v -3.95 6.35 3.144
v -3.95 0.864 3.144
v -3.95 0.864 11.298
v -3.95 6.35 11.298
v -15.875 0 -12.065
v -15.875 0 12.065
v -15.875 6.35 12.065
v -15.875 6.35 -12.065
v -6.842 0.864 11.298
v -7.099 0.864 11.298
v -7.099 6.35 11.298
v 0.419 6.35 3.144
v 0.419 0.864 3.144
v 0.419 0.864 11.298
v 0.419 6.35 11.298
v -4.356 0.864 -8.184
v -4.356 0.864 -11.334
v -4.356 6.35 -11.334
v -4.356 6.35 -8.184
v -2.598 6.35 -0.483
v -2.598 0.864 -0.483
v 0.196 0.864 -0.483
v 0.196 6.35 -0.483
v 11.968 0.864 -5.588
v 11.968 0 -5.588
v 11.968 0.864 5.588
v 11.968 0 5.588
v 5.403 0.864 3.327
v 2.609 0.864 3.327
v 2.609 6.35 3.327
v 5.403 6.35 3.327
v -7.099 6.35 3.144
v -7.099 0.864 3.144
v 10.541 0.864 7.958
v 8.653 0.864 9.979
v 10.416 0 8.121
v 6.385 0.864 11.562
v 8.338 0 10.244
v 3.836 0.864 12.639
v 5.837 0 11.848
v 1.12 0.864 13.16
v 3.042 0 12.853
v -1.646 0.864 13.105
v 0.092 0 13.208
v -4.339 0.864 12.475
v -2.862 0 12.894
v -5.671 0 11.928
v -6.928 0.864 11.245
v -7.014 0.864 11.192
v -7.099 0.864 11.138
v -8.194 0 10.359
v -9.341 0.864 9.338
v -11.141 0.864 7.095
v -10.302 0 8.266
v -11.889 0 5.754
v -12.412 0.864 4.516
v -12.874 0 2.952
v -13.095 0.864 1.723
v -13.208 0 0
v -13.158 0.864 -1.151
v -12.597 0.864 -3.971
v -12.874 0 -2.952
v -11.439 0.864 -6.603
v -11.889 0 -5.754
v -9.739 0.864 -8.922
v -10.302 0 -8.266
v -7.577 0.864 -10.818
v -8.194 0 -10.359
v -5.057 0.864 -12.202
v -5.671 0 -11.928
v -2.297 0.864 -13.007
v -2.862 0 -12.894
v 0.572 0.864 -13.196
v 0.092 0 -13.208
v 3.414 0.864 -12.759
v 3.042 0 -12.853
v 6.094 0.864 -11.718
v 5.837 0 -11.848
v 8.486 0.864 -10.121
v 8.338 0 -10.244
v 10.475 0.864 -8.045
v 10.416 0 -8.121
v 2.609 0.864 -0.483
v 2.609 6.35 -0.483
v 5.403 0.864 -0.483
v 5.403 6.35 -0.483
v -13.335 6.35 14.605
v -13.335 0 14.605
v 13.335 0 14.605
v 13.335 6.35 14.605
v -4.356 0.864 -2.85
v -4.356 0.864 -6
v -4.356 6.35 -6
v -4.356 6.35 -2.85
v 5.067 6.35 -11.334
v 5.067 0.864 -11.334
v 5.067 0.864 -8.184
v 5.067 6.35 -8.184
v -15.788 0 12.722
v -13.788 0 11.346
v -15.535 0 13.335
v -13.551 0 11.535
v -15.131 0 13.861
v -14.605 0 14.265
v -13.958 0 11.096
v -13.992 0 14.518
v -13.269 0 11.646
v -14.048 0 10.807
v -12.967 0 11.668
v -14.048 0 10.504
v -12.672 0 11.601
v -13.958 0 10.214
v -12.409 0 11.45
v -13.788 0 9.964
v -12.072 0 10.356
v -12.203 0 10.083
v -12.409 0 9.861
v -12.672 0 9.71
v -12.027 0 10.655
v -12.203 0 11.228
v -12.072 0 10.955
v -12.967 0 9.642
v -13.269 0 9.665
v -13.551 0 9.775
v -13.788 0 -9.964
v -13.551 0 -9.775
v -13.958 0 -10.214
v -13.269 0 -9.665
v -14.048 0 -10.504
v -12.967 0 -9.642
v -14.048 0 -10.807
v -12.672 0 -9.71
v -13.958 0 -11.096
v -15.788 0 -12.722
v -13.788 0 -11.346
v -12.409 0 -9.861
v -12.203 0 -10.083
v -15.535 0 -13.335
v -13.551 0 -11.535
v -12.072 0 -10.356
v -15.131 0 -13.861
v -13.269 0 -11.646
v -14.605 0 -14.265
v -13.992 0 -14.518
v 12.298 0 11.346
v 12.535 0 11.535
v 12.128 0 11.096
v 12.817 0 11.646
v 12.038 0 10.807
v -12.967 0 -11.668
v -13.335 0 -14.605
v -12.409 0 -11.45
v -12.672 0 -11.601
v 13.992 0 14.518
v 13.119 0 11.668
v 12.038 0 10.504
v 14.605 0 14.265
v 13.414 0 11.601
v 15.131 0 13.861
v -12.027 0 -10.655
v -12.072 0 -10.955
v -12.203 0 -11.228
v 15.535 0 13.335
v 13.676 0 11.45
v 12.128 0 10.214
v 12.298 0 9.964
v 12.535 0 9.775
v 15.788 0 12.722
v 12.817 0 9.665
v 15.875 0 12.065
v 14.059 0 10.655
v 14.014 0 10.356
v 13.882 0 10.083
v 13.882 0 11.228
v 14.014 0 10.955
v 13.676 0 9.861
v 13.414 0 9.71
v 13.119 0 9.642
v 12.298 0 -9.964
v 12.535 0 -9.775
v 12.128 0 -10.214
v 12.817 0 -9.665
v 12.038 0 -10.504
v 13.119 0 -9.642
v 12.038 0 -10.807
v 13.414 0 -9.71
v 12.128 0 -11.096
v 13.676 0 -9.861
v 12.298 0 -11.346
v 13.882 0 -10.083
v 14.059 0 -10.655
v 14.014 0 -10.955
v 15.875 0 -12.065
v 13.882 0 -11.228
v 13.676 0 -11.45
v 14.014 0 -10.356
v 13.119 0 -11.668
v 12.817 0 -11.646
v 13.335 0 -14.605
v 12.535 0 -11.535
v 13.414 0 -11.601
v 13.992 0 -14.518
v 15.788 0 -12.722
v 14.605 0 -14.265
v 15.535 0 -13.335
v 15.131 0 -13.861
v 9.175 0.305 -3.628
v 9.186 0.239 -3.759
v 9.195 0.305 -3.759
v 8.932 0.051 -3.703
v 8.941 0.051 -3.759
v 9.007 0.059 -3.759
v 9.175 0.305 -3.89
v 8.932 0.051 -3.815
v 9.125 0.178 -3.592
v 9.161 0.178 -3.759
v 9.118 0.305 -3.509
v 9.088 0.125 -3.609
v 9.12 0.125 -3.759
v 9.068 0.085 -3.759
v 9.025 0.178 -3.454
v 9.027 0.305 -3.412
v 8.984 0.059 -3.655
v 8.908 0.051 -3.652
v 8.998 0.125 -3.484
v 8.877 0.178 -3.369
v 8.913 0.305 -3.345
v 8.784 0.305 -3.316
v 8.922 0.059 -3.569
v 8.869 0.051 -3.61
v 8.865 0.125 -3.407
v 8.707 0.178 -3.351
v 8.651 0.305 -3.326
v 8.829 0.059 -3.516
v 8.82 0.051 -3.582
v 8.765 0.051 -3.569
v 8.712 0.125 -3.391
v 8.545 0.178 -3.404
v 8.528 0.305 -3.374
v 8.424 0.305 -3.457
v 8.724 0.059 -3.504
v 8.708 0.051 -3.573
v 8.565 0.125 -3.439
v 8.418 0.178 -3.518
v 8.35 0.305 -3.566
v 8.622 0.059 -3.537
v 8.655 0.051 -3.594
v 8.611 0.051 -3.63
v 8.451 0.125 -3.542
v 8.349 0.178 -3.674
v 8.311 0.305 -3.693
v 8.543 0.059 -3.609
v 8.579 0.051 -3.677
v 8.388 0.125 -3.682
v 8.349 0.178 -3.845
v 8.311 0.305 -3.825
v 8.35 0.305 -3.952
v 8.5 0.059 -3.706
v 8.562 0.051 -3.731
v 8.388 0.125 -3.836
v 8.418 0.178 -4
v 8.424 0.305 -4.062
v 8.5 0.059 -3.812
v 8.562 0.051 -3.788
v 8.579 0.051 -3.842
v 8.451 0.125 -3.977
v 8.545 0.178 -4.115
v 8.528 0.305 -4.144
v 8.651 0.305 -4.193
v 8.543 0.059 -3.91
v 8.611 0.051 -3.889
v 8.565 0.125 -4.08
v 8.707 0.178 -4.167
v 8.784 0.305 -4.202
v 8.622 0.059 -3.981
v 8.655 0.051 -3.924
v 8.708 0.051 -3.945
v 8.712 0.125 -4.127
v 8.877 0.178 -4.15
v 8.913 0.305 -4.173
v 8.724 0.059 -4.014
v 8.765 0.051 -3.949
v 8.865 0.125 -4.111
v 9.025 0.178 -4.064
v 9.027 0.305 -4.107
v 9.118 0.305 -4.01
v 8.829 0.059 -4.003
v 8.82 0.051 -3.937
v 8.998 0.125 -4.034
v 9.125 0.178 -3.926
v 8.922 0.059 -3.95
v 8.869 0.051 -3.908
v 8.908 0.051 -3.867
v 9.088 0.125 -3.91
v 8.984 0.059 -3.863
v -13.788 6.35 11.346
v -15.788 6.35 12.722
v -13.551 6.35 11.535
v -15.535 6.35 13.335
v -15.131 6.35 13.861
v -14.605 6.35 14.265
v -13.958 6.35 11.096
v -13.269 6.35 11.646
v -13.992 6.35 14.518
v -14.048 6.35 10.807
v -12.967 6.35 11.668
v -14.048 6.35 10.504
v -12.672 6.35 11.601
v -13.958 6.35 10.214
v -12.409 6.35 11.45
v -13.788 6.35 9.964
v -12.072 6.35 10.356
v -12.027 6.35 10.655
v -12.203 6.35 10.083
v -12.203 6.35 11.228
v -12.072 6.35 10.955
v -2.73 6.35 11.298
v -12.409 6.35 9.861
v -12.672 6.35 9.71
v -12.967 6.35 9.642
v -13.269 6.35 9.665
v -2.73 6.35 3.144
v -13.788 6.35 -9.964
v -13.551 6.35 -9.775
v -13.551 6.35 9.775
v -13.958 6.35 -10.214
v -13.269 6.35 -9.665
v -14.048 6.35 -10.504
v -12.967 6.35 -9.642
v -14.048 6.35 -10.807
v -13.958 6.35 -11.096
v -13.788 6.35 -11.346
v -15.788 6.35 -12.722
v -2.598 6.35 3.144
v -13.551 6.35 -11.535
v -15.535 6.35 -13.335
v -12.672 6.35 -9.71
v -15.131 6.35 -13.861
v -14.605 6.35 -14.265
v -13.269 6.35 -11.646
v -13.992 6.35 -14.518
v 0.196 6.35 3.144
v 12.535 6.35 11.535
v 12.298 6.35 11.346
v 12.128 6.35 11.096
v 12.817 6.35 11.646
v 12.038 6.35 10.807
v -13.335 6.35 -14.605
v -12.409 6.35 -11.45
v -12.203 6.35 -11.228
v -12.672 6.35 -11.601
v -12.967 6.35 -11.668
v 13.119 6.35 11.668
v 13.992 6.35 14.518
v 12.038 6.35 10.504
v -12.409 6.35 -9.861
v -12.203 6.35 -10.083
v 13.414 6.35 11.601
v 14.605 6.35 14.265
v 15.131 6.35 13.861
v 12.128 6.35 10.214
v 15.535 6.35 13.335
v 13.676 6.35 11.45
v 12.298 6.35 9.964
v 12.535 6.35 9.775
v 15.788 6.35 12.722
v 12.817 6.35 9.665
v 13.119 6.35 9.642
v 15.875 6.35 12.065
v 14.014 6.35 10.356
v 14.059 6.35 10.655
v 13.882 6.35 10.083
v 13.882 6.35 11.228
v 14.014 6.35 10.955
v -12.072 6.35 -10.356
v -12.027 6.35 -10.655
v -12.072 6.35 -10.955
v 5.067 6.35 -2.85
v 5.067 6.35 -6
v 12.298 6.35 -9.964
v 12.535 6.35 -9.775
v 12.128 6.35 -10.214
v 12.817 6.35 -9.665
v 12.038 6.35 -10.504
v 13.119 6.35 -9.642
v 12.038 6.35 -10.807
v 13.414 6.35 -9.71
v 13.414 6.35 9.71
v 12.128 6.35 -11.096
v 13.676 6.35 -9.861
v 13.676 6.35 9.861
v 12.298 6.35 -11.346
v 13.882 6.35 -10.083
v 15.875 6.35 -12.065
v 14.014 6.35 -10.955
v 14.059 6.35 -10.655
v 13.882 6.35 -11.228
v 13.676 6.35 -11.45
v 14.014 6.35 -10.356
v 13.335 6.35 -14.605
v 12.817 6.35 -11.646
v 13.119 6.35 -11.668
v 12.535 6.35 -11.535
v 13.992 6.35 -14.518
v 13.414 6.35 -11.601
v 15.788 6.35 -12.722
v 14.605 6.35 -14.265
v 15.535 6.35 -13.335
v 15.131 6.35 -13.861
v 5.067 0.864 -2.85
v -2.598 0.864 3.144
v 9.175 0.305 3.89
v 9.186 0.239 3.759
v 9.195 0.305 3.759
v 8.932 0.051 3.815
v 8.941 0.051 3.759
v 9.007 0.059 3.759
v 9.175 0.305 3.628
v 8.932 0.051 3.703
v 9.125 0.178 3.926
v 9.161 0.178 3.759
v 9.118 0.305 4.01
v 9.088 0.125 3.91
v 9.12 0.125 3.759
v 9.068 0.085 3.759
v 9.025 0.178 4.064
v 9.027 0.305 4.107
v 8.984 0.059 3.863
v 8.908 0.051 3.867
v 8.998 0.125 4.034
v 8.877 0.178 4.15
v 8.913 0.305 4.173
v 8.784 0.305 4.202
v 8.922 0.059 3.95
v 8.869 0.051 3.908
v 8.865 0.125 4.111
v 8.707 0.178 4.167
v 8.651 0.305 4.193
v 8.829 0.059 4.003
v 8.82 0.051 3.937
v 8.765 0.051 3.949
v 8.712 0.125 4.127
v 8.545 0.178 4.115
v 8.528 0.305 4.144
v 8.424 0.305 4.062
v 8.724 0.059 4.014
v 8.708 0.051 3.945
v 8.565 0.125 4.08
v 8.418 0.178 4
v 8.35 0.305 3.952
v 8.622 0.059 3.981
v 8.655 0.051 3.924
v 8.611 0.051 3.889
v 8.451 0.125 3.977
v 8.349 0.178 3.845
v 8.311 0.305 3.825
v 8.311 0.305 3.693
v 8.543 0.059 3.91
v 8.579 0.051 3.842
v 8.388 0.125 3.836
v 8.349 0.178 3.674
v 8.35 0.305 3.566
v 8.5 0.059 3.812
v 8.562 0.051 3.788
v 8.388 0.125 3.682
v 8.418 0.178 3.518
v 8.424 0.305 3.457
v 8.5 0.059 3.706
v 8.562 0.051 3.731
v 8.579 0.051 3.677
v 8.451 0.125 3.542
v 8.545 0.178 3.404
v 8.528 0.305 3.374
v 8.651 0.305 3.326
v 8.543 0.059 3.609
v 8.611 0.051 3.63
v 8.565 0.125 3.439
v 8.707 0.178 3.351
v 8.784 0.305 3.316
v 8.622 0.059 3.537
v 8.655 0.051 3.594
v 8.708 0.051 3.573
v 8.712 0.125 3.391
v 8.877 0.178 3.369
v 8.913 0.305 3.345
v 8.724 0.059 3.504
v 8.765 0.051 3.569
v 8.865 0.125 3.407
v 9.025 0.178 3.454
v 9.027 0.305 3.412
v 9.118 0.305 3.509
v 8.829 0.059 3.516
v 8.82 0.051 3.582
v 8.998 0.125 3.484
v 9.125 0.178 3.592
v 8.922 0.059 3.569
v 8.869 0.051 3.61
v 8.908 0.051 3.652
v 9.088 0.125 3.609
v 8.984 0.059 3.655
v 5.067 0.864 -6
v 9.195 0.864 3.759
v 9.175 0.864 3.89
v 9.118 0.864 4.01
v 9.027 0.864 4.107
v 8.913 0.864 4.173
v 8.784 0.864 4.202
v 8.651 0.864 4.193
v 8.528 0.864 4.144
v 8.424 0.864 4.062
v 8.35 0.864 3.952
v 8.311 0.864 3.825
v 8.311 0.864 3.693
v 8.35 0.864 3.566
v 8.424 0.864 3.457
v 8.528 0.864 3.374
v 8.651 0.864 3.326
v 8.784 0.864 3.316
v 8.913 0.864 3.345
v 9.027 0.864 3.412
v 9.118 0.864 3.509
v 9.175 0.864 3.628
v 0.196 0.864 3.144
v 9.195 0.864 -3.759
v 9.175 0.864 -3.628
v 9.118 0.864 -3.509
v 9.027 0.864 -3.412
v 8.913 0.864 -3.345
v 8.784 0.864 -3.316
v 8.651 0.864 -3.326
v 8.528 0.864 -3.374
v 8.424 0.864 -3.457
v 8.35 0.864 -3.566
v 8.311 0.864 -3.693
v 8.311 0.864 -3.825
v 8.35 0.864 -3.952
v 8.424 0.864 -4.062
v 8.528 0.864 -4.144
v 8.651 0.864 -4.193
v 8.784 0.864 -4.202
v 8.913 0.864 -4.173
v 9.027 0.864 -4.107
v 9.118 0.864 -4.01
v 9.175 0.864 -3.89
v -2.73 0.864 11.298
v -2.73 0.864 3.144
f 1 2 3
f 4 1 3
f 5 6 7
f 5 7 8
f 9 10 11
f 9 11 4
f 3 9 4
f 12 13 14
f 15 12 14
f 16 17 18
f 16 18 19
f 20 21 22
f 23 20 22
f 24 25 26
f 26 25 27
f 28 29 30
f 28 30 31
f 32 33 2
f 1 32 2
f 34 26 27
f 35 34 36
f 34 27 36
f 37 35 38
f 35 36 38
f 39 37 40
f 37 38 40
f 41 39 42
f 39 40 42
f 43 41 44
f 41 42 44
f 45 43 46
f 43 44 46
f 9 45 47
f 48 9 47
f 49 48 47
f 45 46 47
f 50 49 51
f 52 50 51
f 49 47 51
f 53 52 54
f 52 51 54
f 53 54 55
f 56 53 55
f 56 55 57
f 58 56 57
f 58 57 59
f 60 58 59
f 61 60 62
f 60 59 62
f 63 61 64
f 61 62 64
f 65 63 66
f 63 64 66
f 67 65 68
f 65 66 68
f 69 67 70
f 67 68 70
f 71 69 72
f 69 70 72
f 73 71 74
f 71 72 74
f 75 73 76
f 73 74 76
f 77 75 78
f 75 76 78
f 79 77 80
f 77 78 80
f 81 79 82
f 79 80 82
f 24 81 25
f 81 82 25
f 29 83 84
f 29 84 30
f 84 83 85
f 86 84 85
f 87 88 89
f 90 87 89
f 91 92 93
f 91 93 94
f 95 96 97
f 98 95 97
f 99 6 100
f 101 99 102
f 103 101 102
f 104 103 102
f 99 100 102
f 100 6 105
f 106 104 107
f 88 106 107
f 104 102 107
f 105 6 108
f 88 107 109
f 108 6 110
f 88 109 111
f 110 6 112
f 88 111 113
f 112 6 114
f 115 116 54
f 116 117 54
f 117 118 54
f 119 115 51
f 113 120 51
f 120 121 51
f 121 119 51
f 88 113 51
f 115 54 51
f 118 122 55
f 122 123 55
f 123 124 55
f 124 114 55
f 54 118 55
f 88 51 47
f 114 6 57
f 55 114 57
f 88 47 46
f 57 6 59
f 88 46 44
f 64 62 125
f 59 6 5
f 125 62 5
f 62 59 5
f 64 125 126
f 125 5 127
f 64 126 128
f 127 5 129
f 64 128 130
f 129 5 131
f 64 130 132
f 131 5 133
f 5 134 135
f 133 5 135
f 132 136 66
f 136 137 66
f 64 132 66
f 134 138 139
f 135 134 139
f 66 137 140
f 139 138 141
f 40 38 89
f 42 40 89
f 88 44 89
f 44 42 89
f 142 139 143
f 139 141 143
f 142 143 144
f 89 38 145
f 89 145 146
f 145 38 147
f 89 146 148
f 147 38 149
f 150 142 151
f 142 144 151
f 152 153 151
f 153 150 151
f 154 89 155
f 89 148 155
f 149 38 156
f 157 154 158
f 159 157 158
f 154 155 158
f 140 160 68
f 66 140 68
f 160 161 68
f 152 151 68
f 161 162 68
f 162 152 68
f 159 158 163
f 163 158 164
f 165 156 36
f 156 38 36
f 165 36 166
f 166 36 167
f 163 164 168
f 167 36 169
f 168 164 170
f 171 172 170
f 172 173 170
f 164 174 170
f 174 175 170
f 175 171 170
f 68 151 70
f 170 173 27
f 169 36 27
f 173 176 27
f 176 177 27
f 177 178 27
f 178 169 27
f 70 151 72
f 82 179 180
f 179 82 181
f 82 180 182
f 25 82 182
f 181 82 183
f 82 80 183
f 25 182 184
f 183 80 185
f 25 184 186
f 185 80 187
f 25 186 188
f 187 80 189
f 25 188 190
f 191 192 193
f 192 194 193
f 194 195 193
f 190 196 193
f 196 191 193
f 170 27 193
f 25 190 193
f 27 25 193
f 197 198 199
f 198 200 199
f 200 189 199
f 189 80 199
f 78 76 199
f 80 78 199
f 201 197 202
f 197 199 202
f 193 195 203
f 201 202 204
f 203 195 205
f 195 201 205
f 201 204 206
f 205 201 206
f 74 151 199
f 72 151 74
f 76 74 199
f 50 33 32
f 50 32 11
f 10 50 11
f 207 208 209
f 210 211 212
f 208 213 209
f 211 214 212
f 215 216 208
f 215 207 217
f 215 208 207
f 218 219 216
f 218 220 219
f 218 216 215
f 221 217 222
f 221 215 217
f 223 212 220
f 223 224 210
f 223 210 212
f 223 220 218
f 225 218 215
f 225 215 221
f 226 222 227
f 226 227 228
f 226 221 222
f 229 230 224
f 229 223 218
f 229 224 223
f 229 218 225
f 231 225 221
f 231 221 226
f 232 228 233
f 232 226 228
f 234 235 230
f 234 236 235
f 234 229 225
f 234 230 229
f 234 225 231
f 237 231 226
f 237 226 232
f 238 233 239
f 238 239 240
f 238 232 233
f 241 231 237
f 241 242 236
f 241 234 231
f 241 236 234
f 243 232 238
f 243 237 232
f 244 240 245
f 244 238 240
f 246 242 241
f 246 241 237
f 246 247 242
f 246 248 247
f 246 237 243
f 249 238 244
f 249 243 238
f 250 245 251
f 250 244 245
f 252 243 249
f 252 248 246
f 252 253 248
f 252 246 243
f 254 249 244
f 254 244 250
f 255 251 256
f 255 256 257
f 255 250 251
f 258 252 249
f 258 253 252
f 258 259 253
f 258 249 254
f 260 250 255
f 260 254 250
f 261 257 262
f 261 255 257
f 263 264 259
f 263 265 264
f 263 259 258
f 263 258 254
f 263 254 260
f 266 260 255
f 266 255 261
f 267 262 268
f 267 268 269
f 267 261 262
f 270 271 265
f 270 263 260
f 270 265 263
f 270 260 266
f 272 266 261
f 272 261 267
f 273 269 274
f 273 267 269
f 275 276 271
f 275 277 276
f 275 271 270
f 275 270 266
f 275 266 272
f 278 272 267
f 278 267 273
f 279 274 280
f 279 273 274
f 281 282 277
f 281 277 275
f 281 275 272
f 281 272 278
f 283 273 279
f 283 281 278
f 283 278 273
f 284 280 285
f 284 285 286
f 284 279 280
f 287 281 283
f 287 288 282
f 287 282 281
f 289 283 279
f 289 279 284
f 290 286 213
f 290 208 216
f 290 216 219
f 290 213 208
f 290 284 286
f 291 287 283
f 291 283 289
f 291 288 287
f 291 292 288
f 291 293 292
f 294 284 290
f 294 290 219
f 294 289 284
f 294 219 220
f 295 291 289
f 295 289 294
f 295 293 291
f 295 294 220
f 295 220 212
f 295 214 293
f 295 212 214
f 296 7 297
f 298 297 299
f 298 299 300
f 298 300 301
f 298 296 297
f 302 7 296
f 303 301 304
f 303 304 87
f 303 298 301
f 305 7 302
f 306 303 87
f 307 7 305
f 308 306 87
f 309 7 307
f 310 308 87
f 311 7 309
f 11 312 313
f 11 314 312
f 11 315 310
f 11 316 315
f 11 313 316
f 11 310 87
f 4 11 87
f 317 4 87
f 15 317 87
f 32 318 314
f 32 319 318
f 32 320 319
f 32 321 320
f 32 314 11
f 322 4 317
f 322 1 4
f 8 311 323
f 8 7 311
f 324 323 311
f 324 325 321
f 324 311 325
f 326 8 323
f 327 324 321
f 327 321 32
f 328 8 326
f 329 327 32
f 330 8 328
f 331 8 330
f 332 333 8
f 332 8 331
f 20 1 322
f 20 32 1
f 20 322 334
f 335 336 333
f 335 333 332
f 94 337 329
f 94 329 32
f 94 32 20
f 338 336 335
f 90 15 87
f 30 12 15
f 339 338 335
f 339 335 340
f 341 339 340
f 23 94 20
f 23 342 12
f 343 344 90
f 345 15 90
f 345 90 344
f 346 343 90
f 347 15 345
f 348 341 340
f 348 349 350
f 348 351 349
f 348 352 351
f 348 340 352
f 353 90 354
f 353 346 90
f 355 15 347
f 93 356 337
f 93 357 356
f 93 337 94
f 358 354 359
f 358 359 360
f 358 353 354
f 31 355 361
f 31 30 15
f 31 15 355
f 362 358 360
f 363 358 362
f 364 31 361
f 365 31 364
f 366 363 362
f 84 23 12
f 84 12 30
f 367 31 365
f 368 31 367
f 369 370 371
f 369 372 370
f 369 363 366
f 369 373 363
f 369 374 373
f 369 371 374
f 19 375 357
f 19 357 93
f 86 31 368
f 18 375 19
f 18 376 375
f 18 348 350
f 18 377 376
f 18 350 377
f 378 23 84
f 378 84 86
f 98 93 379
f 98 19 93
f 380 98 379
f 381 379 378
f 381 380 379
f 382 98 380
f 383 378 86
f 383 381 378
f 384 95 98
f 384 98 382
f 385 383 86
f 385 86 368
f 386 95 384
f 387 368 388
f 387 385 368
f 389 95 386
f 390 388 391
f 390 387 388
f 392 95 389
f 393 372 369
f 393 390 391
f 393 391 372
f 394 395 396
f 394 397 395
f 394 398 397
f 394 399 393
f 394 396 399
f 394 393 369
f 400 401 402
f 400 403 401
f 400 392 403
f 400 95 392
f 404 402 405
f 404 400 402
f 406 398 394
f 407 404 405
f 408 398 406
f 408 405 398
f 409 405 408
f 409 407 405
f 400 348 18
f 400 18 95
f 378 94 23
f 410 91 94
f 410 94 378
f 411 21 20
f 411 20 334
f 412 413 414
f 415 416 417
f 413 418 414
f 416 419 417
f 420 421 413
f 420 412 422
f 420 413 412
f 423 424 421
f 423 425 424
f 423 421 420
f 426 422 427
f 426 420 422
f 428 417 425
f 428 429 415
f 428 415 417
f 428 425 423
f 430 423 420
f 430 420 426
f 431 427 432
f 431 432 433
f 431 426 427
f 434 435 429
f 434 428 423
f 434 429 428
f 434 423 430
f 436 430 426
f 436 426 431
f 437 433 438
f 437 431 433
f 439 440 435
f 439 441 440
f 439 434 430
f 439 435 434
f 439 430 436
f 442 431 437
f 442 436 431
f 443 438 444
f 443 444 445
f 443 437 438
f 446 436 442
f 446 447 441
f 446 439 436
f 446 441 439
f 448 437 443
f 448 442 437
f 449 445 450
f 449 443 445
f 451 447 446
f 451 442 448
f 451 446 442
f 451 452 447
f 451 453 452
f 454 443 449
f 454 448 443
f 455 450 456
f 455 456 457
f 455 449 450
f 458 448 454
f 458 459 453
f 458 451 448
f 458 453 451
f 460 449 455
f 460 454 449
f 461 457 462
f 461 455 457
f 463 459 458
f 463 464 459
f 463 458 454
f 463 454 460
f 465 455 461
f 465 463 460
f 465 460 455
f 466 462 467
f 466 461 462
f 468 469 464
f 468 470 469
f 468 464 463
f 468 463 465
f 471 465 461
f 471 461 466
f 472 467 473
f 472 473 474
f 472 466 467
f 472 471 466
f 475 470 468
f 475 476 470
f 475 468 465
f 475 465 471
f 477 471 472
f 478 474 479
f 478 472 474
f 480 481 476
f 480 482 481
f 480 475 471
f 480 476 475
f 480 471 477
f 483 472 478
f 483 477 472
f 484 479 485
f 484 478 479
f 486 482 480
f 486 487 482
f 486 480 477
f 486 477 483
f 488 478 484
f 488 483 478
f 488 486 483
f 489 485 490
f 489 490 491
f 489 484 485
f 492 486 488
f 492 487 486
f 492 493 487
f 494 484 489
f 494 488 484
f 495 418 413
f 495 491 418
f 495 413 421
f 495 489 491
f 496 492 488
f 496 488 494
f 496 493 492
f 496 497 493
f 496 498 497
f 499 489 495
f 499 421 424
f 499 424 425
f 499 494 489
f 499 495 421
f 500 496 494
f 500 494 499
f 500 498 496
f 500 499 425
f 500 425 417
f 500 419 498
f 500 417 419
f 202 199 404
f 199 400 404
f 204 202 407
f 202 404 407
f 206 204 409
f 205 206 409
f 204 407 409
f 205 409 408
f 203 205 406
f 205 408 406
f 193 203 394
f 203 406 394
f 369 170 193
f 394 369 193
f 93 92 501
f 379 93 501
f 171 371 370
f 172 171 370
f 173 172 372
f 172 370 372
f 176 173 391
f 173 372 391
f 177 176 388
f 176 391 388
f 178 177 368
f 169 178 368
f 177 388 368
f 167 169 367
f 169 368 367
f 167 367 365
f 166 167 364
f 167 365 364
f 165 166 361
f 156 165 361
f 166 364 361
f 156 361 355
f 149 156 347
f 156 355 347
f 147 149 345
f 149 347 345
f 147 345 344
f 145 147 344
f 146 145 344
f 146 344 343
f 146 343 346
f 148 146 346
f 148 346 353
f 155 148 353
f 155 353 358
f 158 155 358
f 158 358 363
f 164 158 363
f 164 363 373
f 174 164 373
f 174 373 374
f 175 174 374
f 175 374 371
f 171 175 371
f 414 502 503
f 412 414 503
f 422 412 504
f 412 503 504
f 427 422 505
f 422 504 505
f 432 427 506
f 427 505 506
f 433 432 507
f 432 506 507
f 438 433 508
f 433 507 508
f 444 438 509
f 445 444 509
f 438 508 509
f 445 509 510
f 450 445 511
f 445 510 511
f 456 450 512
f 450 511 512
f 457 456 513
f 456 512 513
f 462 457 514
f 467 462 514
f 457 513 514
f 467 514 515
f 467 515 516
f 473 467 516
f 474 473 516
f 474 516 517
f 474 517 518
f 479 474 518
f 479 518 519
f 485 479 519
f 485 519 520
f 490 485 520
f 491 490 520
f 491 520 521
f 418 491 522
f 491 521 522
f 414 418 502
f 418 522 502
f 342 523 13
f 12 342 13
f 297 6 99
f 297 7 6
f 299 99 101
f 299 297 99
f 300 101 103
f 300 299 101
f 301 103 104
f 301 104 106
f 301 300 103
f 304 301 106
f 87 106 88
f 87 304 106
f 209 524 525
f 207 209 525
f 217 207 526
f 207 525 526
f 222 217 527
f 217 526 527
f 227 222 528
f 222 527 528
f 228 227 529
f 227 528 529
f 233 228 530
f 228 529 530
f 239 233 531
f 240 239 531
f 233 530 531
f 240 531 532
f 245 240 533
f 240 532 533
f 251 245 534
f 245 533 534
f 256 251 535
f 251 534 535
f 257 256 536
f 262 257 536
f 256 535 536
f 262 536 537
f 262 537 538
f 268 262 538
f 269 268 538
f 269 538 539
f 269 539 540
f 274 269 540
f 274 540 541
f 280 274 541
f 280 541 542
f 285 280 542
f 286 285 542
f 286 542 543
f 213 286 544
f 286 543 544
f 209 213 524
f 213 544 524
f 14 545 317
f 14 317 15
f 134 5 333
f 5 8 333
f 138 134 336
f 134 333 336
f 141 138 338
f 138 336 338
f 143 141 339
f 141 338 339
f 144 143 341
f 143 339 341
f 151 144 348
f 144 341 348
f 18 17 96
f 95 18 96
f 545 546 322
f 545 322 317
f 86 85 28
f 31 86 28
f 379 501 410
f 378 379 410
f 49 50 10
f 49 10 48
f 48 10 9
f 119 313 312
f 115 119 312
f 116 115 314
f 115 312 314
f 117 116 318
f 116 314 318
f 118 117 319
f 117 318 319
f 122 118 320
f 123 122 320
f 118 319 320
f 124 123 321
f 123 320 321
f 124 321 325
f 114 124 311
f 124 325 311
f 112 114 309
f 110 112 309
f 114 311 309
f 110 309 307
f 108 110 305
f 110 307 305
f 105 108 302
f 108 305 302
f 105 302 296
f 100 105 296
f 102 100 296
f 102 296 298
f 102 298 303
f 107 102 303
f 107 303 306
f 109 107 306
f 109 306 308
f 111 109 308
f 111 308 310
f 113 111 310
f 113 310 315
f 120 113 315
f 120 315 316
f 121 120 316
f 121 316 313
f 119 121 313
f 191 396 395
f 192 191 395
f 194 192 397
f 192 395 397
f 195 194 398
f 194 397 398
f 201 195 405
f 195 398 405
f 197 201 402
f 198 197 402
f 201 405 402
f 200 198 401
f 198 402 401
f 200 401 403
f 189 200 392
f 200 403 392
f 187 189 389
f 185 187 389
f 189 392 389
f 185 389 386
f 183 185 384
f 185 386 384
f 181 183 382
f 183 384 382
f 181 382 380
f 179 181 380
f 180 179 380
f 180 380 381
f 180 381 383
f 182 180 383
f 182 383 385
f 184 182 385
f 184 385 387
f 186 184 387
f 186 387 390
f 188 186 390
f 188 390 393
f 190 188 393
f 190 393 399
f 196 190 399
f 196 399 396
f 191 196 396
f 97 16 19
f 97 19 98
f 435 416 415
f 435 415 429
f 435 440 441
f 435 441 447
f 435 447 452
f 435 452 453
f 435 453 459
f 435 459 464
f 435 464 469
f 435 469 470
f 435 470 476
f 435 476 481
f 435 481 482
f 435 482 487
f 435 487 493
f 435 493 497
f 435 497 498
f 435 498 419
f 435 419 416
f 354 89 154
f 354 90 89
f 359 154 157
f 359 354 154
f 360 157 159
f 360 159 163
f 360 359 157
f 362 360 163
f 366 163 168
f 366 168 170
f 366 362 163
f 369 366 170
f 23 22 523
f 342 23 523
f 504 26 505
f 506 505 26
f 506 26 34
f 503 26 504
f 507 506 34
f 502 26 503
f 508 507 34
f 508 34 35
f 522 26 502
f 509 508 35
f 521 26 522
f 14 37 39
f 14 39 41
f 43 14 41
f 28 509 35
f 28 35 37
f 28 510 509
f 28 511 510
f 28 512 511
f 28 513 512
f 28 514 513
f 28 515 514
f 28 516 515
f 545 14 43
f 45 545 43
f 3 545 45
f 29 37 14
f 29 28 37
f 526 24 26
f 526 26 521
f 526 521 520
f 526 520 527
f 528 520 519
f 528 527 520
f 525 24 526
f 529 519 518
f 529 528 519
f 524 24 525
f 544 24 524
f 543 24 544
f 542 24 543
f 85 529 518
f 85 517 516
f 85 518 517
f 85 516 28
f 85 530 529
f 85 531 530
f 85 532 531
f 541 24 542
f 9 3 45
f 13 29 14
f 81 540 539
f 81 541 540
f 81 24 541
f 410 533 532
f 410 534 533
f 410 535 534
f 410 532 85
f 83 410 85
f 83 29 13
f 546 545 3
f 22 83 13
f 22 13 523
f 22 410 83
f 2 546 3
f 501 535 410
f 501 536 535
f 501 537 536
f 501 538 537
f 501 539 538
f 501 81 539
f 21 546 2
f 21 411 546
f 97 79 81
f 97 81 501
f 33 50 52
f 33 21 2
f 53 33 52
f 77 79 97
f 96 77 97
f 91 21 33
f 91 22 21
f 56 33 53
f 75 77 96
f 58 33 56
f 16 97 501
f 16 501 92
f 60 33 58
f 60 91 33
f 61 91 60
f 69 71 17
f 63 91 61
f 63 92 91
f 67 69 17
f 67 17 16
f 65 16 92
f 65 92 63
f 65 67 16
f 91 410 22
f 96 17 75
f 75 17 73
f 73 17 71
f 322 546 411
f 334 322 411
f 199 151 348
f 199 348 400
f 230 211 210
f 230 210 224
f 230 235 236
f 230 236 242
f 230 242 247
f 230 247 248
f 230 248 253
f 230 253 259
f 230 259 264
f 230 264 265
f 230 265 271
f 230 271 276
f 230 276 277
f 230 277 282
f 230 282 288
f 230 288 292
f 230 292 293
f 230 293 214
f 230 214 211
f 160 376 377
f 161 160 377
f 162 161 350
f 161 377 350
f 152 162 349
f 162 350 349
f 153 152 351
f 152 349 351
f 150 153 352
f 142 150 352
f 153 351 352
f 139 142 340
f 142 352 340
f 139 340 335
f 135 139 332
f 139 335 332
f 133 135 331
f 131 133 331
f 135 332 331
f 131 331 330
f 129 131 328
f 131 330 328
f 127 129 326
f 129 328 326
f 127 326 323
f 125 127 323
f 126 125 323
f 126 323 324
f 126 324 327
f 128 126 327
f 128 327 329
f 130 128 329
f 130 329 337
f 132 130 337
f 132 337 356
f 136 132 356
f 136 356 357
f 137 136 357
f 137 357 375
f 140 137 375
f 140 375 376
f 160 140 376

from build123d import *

# Parameters (mm, degrees)
SKETCH3_W           = 31.75
SKETCH3_H           = 29.21
BOSS_EXTRUDE2_DEPTH = 6.35
CUT_EXTRUDE1_DEPTH  = 0.8636
SKETCH6_R           = 1.016
CUT_EXTRUDE3_DEPTH  = 8.89
SKETCH4_W           = 9.4234
SKETCH4_H           = 3.1496
SKETCH4_W_2         = 3.1496
SKETCH4_H_2         = 8.1534
CUT_EXTRUDE2_DEPTH  = 6.4864
SKETCH7_W           = 2.794
SKETCH7_H           = 3.81
CUT_EXTRUDE4_DEPTH  = 6.4864
FILLET1_R           = 2.54
SKETCH9_R           = 0.4445
BOSS_EXTRUDE3_DEPTH = 0.8128
FILLET2_R           = 0.254


with BuildPart() as part:
    # Sketch3 → Boss-Extrude2 (new body)
    with BuildSketch(Plane(origin=(0, 0, 0), x_dir=(1, 0, 0), z_dir=(0, 1, 0))):
        Rectangle(SKETCH3_W, SKETCH3_H)
    extrude(amount=BOSS_EXTRUDE2_DEPTH)

    # Sketch1 → Cut-Extrude1 (cut)
    with BuildSketch(Plane(origin=(0, 0, 0), x_dir=(1, 0, 0), z_dir=(0, 1, 0))):
        with BuildLine():
            Line((11.967686493, 5.588), (11.967686493, -5.588))
            ThreePointArc((11.967686493, -5.588), (-13.208, 0), (11.967686493, 5.588))
        make_face()
    extrude(amount=CUT_EXTRUDE1_DEPTH, mode=Mode.SUBTRACT)

    # Sketch6 → Cut-Extrude3 (cut)
    with BuildSketch(Plane(origin=(0, 6.35, 0), x_dir=(1, 0, 0), z_dir=(0, 1, 0))):
        with Locations((-13.0429, 10.6553)):
            Circle(SKETCH6_R)
        with Locations((13.0429, 10.6553)):
            Circle(SKETCH6_R)
        with Locations((13.0429, -10.6553)):
            Circle(SKETCH6_R)
        with Locations((-13.0429, -10.6553)):
            Circle(SKETCH6_R)
    extrude(amount=-CUT_EXTRUDE3_DEPTH, mode=Mode.SUBTRACT)

    # Sketch4 → Cut-Extrude2 (cut, through all)
    with BuildSketch(Plane.XZ.offset(-0.8636)):
        with Locations((0.3556, -9.758937639)):
            Rectangle(SKETCH4_W, SKETCH4_H)
        with Locations((-5.5245, 7.220962361)):
            Rectangle(SKETCH4_W_2, SKETCH4_H_2)
        with Locations((0.3556, -4.424937639)):
            Rectangle(SKETCH4_W, SKETCH4_H)
        with Locations((-1.1557, 7.220962361)):
            Rectangle(SKETCH4_W_2, SKETCH4_H_2)
    extrude(amount=-CUT_EXTRUDE2_DEPTH, mode=Mode.SUBTRACT)

    # Sketch7 → Cut-Extrude4 (cut, through all)
    with BuildSketch(Plane.XZ.offset(-0.8636)):
        with Locations((-1.201434663, 1.4224)):
            Rectangle(SKETCH7_W, SKETCH7_H)
        with Locations((4.005565337, 1.4224)):
            Rectangle(SKETCH7_W, SKETCH7_H)
    extrude(amount=-CUT_EXTRUDE4_DEPTH, mode=Mode.SUBTRACT)

    # Fillet1
    fillet1_edges = [part.edges().sort_by_distance(p)[0] for p in [
        (-15.875, 3.175, -14.605),
        (15.875, 3.175, -14.605),
        (15.875, 3.175, 14.605),
        (-15.875, 3.175, 14.605),
    ]]
    fillet(fillet1_edges, radius=FILLET1_R)

    # Sketch9 → Boss-Extrude3 (add)
    with BuildSketch(Plane.XZ.offset(-0.8636)):
        with Locations((8.7503, 3.7592)):
            Circle(SKETCH9_R)
        with Locations((8.7503, -3.7592)):
            Circle(SKETCH9_R)
    extrude(amount=BOSS_EXTRUDE3_DEPTH)

    # Fillet2
    fillet2_edges = [part.edges().sort_by_distance(p)[0] for p in [
        (8.3058, 0.0508, 3.7592),
        (8.3058, 0.0508, -3.7592),
    ]]
    fillet(fillet2_edges, radius=FILLET2_R)


solid = part.part
